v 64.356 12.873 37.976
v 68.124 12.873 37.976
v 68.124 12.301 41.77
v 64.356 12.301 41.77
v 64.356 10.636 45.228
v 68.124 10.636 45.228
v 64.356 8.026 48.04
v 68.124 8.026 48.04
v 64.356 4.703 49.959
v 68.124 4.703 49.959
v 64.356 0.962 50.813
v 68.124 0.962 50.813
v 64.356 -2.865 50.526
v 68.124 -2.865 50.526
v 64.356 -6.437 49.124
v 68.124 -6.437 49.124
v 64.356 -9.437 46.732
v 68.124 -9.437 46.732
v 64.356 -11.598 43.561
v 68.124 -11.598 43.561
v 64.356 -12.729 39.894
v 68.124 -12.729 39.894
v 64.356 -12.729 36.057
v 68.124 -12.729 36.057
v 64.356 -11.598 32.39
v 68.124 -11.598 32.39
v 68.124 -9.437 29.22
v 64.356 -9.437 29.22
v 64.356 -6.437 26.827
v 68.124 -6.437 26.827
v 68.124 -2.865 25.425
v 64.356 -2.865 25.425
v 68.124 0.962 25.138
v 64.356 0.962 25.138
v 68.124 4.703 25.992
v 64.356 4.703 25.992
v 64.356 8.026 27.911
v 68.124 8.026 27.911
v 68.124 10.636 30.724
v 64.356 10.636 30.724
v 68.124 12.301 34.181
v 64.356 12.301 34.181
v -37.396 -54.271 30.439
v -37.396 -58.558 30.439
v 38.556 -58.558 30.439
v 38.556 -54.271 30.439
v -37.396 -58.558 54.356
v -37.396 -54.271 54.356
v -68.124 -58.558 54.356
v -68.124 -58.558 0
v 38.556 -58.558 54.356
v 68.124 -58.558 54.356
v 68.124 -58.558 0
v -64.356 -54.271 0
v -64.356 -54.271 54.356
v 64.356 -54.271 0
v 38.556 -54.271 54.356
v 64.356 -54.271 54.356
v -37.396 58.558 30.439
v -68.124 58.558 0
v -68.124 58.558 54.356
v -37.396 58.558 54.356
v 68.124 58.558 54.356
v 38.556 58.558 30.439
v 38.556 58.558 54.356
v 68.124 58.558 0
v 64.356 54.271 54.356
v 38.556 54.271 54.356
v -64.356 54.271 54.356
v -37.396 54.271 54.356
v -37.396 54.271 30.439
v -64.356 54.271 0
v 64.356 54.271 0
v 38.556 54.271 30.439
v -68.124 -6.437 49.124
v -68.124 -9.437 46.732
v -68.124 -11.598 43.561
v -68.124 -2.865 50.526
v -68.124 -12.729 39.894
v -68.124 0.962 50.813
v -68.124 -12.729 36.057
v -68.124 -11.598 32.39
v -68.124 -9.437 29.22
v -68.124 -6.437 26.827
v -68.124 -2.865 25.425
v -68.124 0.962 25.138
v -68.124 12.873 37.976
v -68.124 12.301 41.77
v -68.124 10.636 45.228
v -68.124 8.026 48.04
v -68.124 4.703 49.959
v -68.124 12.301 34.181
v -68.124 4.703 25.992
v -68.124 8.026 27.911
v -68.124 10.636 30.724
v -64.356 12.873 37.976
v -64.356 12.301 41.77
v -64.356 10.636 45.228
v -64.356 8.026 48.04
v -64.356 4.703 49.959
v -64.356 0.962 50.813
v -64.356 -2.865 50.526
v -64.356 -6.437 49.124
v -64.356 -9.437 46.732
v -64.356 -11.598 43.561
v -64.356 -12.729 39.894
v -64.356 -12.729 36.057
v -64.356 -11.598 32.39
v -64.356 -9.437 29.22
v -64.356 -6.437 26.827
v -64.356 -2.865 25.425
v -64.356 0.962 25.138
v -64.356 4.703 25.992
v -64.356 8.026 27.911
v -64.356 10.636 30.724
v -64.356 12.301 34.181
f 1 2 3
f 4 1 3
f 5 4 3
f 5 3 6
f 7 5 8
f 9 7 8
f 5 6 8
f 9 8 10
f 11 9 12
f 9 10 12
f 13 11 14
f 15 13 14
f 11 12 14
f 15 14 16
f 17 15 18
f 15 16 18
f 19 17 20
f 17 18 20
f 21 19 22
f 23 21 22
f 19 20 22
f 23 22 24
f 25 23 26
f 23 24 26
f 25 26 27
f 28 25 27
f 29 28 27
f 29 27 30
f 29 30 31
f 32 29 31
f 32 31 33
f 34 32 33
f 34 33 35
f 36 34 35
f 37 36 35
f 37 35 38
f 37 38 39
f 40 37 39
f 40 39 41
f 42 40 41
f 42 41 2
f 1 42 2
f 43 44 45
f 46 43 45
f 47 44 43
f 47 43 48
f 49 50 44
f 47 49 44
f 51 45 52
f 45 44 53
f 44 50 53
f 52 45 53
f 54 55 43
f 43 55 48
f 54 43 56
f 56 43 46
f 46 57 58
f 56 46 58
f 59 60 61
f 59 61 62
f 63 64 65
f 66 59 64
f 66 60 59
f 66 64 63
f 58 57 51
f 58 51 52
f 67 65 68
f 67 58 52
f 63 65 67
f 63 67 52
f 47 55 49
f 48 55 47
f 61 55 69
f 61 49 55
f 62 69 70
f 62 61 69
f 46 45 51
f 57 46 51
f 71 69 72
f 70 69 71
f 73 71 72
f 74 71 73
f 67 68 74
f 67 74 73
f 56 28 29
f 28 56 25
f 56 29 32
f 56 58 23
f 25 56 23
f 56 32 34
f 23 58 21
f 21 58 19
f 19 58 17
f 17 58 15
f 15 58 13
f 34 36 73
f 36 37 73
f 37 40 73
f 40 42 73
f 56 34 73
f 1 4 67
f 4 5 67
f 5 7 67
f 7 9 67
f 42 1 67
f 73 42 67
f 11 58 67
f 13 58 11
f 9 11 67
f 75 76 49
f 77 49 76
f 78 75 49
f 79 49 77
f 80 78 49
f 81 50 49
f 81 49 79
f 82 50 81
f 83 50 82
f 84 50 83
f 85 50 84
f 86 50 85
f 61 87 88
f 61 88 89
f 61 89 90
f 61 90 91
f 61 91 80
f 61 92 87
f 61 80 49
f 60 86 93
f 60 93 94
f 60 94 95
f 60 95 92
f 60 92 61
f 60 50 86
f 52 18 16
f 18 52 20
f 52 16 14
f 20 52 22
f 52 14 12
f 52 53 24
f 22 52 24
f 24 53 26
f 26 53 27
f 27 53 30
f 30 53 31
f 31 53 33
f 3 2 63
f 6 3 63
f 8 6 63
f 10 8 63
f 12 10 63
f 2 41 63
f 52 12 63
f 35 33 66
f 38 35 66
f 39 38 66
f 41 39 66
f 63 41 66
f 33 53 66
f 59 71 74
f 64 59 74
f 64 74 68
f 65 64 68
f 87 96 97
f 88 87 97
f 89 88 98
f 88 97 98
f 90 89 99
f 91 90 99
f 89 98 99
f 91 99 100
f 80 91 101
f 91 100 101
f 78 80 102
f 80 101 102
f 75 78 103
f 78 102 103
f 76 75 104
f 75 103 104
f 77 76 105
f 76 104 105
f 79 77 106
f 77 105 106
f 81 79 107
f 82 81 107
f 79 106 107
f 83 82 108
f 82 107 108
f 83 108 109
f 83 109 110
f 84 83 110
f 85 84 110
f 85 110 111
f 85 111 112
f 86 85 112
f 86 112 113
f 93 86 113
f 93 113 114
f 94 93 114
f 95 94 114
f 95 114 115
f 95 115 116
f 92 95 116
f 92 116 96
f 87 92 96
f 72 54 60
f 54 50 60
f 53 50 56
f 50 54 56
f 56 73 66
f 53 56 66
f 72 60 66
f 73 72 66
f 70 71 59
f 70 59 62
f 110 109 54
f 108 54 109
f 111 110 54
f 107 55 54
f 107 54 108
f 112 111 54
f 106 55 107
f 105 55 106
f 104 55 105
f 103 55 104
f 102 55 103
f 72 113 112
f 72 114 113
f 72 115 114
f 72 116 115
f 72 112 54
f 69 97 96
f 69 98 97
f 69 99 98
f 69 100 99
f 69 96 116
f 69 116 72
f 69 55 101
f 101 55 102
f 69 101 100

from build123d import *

# Parameters (mm, degrees)
F0_W     = 136.2489163876
F0_H     = 117.116086185
F1_DEPTH = 54.356
F2_W     = 128.7117451429
F2_H     = 108.5429564118
F3_DEPTH = 54.357
F4_R     = 12.8732628807
F5_DEPTH = 136.2499163876
F6_W     = 75.9515240788
F6_H     = 23.9174129305
F7_DEPTH = 117.117086185


with BuildPart() as f1:
    # F0 (on Top) → F1 (new body)
    with BuildSketch(Plane.XY):
        Rectangle(F0_W, F0_H)
    extrude(amount=F1_DEPTH)

    # F2 (on face) → F3 (cut, through all)
    with BuildSketch(Plane.XY.offset(54.356)):
        Rectangle(F2_W, F2_H)
    extrude(amount=-F3_DEPTH, mode=Mode.SUBTRACT)

    # F4 (on face) → F5 (cut, through all)
    with BuildSketch(Plane.YZ.offset(68.1244581938)):
        with Locations((0, 37.9757620394)):
            Circle(F4_R)
    extrude(amount=-F5_DEPTH, mode=Mode.SUBTRACT)

    # F6 (on face) → F7 (cut, through all)
    with BuildSketch(Plane.XZ.offset(58.5580430925)):
        with Locations((0.5797818303, 42.3972935348)):
            Rectangle(F6_W, F6_H)
    extrude(amount=-F7_DEPTH, mode=Mode.SUBTRACT)


solid = f1.part
